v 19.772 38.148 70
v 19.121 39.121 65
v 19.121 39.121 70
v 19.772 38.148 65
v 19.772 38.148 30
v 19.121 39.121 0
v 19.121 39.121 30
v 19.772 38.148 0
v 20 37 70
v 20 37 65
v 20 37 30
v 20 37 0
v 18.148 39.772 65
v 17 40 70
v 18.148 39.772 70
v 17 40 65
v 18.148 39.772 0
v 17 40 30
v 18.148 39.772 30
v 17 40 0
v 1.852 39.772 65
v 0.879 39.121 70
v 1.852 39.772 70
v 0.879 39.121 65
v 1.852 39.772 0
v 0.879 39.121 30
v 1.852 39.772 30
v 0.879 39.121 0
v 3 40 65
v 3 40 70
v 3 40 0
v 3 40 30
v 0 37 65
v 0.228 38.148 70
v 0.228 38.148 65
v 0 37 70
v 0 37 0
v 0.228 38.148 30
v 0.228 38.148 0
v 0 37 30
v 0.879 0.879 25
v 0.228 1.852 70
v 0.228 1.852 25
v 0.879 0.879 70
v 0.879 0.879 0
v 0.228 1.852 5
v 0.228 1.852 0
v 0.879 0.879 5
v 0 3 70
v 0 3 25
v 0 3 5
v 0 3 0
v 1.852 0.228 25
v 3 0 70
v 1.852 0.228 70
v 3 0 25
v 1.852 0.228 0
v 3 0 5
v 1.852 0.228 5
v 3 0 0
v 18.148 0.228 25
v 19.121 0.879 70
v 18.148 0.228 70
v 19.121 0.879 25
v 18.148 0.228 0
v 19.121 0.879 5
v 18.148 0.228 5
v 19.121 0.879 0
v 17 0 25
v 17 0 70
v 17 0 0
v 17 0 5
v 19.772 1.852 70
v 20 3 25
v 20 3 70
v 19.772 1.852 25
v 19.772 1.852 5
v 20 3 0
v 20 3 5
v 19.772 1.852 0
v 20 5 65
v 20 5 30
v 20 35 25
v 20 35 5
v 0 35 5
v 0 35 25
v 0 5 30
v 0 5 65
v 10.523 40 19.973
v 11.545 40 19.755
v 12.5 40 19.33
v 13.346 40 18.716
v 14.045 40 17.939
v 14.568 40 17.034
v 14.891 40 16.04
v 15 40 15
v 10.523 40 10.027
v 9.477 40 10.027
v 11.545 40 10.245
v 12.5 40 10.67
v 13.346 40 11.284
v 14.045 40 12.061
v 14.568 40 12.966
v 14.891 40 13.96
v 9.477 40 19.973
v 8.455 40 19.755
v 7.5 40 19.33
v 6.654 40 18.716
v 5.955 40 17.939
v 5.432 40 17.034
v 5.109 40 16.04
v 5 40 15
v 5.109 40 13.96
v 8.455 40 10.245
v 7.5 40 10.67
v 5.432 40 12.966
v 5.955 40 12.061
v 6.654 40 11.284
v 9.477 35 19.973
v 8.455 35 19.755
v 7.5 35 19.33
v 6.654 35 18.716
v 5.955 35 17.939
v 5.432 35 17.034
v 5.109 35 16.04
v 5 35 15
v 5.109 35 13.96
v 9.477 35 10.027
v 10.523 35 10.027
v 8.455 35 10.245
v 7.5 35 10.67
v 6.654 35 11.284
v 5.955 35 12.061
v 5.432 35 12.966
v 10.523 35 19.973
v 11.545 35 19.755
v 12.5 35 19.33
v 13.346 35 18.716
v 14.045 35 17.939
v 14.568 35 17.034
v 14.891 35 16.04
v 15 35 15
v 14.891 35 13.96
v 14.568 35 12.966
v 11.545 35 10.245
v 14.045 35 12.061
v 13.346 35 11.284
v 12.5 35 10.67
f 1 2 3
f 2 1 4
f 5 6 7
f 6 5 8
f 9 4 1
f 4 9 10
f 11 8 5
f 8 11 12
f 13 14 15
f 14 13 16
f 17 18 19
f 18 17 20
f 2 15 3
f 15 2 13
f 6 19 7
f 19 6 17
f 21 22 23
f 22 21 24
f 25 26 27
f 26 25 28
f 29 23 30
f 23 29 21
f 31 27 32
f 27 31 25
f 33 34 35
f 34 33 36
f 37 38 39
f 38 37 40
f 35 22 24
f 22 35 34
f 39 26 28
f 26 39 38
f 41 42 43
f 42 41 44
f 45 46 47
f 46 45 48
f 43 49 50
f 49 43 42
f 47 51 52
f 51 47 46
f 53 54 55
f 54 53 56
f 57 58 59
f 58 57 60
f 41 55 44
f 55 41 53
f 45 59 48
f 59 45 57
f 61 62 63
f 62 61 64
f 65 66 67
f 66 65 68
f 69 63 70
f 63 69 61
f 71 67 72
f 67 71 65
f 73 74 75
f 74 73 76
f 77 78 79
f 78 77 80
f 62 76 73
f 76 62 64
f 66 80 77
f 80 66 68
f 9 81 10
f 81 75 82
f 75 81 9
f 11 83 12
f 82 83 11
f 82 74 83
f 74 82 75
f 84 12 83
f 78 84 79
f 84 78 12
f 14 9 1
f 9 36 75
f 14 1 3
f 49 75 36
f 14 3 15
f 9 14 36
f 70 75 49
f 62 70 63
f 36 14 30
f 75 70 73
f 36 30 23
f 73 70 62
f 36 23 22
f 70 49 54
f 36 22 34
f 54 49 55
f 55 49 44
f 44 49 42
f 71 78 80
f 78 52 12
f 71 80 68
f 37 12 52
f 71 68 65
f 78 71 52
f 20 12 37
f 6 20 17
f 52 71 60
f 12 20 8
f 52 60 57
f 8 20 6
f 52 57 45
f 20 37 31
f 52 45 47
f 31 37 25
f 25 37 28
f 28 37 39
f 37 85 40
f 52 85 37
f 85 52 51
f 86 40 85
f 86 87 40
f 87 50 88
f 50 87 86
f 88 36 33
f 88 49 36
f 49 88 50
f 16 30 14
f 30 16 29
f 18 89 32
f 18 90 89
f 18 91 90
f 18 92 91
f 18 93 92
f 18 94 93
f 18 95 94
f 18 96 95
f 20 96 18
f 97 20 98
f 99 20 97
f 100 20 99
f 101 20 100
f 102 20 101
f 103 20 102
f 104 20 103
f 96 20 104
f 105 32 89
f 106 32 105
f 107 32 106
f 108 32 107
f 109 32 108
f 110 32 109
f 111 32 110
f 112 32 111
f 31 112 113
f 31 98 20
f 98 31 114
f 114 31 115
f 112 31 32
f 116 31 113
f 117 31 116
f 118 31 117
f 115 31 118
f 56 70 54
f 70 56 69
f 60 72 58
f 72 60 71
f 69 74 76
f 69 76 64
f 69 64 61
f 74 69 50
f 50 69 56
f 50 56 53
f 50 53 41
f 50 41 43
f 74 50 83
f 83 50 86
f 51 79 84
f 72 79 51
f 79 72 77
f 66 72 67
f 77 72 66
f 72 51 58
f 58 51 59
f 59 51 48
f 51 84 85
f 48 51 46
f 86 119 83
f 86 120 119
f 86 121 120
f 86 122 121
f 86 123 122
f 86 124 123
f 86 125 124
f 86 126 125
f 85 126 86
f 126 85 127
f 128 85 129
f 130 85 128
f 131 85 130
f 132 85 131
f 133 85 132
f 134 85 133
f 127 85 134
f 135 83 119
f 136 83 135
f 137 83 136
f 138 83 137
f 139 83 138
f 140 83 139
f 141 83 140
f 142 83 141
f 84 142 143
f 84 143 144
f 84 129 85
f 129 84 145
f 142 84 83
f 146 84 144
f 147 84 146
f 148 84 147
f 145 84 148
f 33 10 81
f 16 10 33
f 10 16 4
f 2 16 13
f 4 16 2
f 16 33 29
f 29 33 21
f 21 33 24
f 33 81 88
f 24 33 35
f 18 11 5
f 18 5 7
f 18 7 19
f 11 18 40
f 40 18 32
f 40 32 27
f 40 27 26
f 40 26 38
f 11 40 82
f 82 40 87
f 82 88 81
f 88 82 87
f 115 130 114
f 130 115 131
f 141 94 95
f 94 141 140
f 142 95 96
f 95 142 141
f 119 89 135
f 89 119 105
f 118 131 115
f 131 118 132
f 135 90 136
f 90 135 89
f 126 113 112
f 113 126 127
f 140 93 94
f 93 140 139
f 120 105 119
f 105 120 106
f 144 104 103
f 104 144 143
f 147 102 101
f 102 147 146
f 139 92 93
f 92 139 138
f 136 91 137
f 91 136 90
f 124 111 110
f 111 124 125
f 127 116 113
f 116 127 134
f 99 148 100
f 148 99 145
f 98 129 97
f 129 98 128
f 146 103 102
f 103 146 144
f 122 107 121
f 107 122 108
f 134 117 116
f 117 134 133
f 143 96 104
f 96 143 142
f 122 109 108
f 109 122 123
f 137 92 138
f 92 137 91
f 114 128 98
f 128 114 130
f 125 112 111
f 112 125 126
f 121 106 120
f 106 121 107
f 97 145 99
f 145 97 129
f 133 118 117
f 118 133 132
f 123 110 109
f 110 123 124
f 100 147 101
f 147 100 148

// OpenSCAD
// Parametric Desk Hook w/ Hole for Headphone Cable
// fros1y 

// Width of hook
width = 20;

// Height of Desk for Hook
desk_height = 35;

// Height for Hook Part
hook_height = 20;

// Thickness of Plastic in Hook
thickness = 5;

// Depth of Hook
depth=40;

// Diameter of Headphone Jack (0 disables)
jack = 10;

// Fillet code borrowed from Vaclav Hula (http://axuv.blogspot.com/2012/05/openscad-helper-funcions-for-better.html)

module fillet(radius, height=100, $fn=16) {                                     
    //this creates negative of fillet,
    //i.e. thing to be substracted from object
    translate([-radius, -radius, -height/2-0.01])
        difference() {
            cube([radius*2, radius*2, height+0.02]);
            cylinder(r=radius, h=height+0.02, $fn=16);
        }
}


module cube_negative_fillet(
        size,
        radius=-1,
        vertical=[3,3,3,3], 
        top=[0,0,0,0],
        bottom=[0,0,0,0],
        $fn=0
    ){

    j=[1,0,1,0];

    for (i=[0:3]) {
        if (radius > -1) {
            rotate([0, 0, 90*i])
                translate([size[1-j[i]]/2, size[j[i]]/2, 0])
                    fillet(radius, size[2], $fn=$fn);
        } else {
            rotate([0, 0, 90*i])
                translate([size[1-j[i]]/2, size[j[i]]/2, 0])
                    fillet(vertical[i], size[2], $fn=$fn);
        }
        rotate([90*i, -90, 0])
            translate([size[2]/2, size[j[i]]/2, 0 ])
                fillet(top[i], size[1-j[i]], $fn=$fn);
        rotate([90*(4-i), 90, 0])
            translate([size[2]/2, size[j[i]]/2, 0])
                fillet(bottom[i], size[1-j[i]], $fn=$fn);
    }
}

module cube_fillet_inside(
         size,
        radius=-1,
        vertical=[3,3,3,3],
        top=[0,0,0,0],
        bottom=[0,0,0,0],
        $fn=0
    ){
    if (radius == 0) {
        cube(size, center=true);
    } else {
        difference() {
            cube(size, center=true);
            cube_negative_fillet(size, radius, vertical, top, bottom, $fn);
        }
    }
}


module cube_fillet(
        size,
        radius=-1,
        vertical=[3,3,3,3],
        top=[0,0,0,0],
        bottom=[0,0,0,0],
        center=false,
        $fn=0 
    ){
    if (center) {
        cube_fillet_inside(size, radius, vertical, top, bottom, $fn);
    } else {
        translate([size[0]/2, size[1]/2, size[2]/2])
            cube_fillet_inside(size, radius, vertical, top, bottom, $fn);
    }
}

module desk_hook(width, desk_height, hook_height, thickness, depth, jack)
{
	difference() {
		cube_fillet([width, depth, thickness + desk_height + thickness + hook_height + thickness]);
		//cube([width, depth, thickness + desk_height + thickness + hook_height + thickness]);

		translate([0, 0, thickness]) {
			cube([width, depth - thickness, hook_height]);
		}

		translate([0, thickness, thickness + hook_height + thickness]) {
			cube([width,depth - thickness, desk_height]);
		}
	
		if(jack > 0)
		{
			translate([width/2, 0, thickness + hook_height /2])
				rotate(90, [1, 0, 0])
				cylinder(r=jack/2, center=true, h=depth*3, $fs=0.05);
		}	
	}
}

desk_hook(width, desk_height, hook_height, thickness, depth, jack);
